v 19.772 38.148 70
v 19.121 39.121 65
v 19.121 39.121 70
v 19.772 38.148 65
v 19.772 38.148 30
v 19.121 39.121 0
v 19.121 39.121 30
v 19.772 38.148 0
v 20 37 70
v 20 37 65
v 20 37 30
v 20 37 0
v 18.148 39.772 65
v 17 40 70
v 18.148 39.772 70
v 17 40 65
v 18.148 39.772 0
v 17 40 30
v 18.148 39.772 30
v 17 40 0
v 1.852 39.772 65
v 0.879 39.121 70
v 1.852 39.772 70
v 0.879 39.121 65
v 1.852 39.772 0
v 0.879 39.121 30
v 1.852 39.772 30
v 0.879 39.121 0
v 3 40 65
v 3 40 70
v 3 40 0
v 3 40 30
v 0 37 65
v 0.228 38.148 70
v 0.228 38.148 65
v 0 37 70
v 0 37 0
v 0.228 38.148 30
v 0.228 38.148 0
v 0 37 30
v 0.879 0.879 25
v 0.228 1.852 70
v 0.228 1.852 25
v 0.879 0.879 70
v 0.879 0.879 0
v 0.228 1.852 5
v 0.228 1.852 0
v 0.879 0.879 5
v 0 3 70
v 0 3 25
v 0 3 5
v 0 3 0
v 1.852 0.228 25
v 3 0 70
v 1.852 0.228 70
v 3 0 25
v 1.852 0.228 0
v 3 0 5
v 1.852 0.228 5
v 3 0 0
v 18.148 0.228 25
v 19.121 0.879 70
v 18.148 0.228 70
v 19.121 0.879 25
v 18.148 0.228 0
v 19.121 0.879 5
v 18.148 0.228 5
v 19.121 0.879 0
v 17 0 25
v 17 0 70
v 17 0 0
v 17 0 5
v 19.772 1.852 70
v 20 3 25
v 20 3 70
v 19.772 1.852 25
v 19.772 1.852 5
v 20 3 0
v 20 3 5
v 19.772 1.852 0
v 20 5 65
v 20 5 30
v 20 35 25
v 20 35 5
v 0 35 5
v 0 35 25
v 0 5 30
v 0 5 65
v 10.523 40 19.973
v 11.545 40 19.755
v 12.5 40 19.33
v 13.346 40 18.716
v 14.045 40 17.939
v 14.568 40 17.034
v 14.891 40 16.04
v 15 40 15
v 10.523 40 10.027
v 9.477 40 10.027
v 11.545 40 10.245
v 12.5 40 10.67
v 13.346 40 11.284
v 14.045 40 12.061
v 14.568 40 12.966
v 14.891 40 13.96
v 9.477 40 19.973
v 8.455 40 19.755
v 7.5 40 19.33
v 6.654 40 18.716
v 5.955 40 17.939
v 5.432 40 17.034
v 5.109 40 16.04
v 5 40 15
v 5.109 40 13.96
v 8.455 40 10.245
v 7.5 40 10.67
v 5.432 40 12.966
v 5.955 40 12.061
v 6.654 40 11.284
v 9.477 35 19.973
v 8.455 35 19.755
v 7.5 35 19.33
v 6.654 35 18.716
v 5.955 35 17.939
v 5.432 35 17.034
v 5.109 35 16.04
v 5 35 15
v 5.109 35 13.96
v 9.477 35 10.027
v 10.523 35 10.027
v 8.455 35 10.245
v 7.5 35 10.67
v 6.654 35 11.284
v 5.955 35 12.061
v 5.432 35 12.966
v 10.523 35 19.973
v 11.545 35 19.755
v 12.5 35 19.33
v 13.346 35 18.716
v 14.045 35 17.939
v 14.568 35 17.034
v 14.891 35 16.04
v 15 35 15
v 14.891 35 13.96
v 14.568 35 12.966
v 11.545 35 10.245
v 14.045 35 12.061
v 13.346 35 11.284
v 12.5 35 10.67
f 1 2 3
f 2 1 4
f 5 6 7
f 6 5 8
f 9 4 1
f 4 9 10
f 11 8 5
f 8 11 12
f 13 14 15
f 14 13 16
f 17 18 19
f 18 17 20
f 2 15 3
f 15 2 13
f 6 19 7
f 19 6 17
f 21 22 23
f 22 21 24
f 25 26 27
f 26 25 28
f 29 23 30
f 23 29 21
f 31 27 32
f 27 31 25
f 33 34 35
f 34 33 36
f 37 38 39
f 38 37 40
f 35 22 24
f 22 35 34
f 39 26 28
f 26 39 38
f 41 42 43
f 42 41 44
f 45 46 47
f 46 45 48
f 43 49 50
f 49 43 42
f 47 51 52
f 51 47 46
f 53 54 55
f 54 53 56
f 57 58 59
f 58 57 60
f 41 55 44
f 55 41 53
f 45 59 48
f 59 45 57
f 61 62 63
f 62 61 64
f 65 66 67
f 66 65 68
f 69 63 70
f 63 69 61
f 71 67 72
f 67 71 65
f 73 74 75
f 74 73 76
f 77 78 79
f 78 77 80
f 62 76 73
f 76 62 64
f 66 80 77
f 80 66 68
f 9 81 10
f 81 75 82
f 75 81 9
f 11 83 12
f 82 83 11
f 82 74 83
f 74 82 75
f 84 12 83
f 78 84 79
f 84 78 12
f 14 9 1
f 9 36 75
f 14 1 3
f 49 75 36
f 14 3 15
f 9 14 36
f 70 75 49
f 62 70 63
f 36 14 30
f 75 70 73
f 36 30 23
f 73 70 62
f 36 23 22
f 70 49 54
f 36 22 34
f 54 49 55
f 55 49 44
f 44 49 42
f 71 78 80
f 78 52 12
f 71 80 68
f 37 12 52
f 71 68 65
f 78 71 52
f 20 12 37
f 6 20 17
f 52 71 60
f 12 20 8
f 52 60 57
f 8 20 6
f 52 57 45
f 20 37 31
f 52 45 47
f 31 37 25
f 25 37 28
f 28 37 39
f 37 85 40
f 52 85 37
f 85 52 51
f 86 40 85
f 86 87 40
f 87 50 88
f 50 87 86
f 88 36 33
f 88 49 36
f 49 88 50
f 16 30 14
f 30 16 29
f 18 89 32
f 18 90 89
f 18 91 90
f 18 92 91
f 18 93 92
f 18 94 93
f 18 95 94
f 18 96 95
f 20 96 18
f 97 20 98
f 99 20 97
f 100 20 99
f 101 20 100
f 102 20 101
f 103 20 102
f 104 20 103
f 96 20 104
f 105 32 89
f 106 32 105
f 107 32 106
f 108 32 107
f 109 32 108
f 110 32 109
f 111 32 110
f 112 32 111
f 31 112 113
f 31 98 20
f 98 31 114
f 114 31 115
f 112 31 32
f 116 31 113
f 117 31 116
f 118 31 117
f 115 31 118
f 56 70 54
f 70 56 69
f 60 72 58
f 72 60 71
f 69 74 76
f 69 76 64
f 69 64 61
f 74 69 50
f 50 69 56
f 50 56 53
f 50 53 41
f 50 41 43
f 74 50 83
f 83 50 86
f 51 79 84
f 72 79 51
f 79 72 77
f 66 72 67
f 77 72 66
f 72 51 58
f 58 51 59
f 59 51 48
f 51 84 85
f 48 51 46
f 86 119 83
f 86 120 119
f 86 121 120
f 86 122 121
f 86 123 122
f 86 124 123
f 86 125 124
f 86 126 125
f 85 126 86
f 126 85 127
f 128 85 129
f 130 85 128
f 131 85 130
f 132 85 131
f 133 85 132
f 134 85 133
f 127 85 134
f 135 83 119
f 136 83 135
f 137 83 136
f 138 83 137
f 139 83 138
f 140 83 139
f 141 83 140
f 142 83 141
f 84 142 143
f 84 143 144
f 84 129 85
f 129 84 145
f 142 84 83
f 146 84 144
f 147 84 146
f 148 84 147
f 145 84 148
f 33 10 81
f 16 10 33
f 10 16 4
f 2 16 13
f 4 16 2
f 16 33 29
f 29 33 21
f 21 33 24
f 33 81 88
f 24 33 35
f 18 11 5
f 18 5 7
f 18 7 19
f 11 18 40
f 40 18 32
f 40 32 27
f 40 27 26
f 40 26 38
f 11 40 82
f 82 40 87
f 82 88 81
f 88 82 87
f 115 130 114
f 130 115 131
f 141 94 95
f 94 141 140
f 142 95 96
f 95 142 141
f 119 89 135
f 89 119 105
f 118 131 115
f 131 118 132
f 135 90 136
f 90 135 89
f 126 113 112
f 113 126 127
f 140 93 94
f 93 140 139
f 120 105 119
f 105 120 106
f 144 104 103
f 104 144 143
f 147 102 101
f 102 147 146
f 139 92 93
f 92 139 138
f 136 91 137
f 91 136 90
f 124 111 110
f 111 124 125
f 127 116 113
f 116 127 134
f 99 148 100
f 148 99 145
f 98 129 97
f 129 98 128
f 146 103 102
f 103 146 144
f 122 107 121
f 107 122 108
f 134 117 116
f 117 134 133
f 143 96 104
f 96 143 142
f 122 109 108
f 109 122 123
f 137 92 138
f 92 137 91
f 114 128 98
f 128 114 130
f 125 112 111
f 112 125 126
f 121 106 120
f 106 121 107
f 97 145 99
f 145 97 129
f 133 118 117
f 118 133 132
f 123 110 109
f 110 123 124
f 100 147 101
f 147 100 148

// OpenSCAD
// Parametric Desk Hook w/ Hole for Headphone Cable
// fros1y 

// Width of hook
width = 20;

// Height of Desk for Hook
desk_height = 35;

// Height for Hook Part
hook_height = 20;

// Thickness of Plastic in Hook
thickness = 5;

// Depth of Hook
depth=40;

// Diameter of Headphone Jack (0 disables)
jack = 10;

// Fillet code borrowed from Vaclav Hula (http://axuv.blogspot.com/2012/05/openscad-helper-funcions-for-better.html)

module fillet(radius, height=100, $fn=16) {                                     
    //this creates negative of fillet,
    //i.e. thing to be substracted from object
    translate([-radius, -radius, -height/2-0.01])
        difference() {
            cube([radius*2, radius*2, height+0.02]);
            cylinder(r=radius, h=height+0.02, $fn=16);
        }
}


module cube_negative_fillet(
        size,
        radius=-1,
        vertical=[3,3,3,3], 
        top=[0,0,0,0],
        bottom=[0,0,0,0],
        $fn=0
    ){

    j=[1,0,1,0];

    for (i=[0:3]) {
        if (radius > -1) {
            rotate([0, 0, 90*i])
                translate([size[1-j[i]]/2, size[j[i]]/2, 0])
                    fillet(radius, size[2], $fn=$fn);
        } else {
            rotate([0, 0, 90*i])
                translate([size[1-j[i]]/2, size[j[i]]/2, 0])
                    fillet(vertical[i], size[2], $fn=$fn);
        }
        rotate([90*i, -90, 0])
            translate([size[2]/2, size[j[i]]/2, 0 ])
                fillet(top[i], size[1-j[i]], $fn=$fn);
        rotate([90*(4-i), 90, 0])
            translate([size[2]/2, size[j[i]]/2, 0])
                fillet(bottom[i], size[1-j[i]], $fn=$fn);
    }
}

module cube_fillet_inside(
         size,
        radius=-1,
        vertical=[3,3,3,3],
        top=[0,0,0,0],
        bottom=[0,0,0,0],
        $fn=0
    ){
    if (radius == 0) {
        cube(size, center=true);
    } else {
        difference() {
            cube(size, center=true);
            cube_negative_fillet(size, radius, vertical, top, bottom, $fn);
        }
    }
}


module cube_fillet(
        size,
        radius=-1,
        vertical=[3,3,3,3],
        top=[0,0,0,0],
        bottom=[0,0,0,0],
        center=false,
        $fn=0 
    ){
    if (center) {
        cube_fillet_inside(size, radius, vertical, top, bottom, $fn);
    } else {
        translate([size[0]/2, size[1]/2, size[2]/2])
            cube_fillet_inside(size, radius, vertical, top, bottom, $fn);
    }
}

module desk_hook(width, desk_height, hook_height, thickness, depth, jack)
{
	difference() {
		cube_fillet([width, depth, thickness + desk_height + thickness + hook_height + thickness]);
		//cube([width, depth, thickness + desk_height + thickness + hook_height + thickness]);

		translate([0, 0, thickness]) {
			cube([width, depth - thickness, hook_height]);
		}

		translate([0, thickness, thickness + hook_height + thickness]) {
			cube([width,depth - thickness, desk_height]);
		}
	
		if(jack > 0)
		{
			translate([width/2, 0, thickness + hook_height /2])
				rotate(90, [1, 0, 0])
				cylinder(r=jack/2, center=true, h=depth*3, $fs=0.05);
		}	
	}
}

desk_hook(width, desk_height, hook_height, thickness, depth, jack);
